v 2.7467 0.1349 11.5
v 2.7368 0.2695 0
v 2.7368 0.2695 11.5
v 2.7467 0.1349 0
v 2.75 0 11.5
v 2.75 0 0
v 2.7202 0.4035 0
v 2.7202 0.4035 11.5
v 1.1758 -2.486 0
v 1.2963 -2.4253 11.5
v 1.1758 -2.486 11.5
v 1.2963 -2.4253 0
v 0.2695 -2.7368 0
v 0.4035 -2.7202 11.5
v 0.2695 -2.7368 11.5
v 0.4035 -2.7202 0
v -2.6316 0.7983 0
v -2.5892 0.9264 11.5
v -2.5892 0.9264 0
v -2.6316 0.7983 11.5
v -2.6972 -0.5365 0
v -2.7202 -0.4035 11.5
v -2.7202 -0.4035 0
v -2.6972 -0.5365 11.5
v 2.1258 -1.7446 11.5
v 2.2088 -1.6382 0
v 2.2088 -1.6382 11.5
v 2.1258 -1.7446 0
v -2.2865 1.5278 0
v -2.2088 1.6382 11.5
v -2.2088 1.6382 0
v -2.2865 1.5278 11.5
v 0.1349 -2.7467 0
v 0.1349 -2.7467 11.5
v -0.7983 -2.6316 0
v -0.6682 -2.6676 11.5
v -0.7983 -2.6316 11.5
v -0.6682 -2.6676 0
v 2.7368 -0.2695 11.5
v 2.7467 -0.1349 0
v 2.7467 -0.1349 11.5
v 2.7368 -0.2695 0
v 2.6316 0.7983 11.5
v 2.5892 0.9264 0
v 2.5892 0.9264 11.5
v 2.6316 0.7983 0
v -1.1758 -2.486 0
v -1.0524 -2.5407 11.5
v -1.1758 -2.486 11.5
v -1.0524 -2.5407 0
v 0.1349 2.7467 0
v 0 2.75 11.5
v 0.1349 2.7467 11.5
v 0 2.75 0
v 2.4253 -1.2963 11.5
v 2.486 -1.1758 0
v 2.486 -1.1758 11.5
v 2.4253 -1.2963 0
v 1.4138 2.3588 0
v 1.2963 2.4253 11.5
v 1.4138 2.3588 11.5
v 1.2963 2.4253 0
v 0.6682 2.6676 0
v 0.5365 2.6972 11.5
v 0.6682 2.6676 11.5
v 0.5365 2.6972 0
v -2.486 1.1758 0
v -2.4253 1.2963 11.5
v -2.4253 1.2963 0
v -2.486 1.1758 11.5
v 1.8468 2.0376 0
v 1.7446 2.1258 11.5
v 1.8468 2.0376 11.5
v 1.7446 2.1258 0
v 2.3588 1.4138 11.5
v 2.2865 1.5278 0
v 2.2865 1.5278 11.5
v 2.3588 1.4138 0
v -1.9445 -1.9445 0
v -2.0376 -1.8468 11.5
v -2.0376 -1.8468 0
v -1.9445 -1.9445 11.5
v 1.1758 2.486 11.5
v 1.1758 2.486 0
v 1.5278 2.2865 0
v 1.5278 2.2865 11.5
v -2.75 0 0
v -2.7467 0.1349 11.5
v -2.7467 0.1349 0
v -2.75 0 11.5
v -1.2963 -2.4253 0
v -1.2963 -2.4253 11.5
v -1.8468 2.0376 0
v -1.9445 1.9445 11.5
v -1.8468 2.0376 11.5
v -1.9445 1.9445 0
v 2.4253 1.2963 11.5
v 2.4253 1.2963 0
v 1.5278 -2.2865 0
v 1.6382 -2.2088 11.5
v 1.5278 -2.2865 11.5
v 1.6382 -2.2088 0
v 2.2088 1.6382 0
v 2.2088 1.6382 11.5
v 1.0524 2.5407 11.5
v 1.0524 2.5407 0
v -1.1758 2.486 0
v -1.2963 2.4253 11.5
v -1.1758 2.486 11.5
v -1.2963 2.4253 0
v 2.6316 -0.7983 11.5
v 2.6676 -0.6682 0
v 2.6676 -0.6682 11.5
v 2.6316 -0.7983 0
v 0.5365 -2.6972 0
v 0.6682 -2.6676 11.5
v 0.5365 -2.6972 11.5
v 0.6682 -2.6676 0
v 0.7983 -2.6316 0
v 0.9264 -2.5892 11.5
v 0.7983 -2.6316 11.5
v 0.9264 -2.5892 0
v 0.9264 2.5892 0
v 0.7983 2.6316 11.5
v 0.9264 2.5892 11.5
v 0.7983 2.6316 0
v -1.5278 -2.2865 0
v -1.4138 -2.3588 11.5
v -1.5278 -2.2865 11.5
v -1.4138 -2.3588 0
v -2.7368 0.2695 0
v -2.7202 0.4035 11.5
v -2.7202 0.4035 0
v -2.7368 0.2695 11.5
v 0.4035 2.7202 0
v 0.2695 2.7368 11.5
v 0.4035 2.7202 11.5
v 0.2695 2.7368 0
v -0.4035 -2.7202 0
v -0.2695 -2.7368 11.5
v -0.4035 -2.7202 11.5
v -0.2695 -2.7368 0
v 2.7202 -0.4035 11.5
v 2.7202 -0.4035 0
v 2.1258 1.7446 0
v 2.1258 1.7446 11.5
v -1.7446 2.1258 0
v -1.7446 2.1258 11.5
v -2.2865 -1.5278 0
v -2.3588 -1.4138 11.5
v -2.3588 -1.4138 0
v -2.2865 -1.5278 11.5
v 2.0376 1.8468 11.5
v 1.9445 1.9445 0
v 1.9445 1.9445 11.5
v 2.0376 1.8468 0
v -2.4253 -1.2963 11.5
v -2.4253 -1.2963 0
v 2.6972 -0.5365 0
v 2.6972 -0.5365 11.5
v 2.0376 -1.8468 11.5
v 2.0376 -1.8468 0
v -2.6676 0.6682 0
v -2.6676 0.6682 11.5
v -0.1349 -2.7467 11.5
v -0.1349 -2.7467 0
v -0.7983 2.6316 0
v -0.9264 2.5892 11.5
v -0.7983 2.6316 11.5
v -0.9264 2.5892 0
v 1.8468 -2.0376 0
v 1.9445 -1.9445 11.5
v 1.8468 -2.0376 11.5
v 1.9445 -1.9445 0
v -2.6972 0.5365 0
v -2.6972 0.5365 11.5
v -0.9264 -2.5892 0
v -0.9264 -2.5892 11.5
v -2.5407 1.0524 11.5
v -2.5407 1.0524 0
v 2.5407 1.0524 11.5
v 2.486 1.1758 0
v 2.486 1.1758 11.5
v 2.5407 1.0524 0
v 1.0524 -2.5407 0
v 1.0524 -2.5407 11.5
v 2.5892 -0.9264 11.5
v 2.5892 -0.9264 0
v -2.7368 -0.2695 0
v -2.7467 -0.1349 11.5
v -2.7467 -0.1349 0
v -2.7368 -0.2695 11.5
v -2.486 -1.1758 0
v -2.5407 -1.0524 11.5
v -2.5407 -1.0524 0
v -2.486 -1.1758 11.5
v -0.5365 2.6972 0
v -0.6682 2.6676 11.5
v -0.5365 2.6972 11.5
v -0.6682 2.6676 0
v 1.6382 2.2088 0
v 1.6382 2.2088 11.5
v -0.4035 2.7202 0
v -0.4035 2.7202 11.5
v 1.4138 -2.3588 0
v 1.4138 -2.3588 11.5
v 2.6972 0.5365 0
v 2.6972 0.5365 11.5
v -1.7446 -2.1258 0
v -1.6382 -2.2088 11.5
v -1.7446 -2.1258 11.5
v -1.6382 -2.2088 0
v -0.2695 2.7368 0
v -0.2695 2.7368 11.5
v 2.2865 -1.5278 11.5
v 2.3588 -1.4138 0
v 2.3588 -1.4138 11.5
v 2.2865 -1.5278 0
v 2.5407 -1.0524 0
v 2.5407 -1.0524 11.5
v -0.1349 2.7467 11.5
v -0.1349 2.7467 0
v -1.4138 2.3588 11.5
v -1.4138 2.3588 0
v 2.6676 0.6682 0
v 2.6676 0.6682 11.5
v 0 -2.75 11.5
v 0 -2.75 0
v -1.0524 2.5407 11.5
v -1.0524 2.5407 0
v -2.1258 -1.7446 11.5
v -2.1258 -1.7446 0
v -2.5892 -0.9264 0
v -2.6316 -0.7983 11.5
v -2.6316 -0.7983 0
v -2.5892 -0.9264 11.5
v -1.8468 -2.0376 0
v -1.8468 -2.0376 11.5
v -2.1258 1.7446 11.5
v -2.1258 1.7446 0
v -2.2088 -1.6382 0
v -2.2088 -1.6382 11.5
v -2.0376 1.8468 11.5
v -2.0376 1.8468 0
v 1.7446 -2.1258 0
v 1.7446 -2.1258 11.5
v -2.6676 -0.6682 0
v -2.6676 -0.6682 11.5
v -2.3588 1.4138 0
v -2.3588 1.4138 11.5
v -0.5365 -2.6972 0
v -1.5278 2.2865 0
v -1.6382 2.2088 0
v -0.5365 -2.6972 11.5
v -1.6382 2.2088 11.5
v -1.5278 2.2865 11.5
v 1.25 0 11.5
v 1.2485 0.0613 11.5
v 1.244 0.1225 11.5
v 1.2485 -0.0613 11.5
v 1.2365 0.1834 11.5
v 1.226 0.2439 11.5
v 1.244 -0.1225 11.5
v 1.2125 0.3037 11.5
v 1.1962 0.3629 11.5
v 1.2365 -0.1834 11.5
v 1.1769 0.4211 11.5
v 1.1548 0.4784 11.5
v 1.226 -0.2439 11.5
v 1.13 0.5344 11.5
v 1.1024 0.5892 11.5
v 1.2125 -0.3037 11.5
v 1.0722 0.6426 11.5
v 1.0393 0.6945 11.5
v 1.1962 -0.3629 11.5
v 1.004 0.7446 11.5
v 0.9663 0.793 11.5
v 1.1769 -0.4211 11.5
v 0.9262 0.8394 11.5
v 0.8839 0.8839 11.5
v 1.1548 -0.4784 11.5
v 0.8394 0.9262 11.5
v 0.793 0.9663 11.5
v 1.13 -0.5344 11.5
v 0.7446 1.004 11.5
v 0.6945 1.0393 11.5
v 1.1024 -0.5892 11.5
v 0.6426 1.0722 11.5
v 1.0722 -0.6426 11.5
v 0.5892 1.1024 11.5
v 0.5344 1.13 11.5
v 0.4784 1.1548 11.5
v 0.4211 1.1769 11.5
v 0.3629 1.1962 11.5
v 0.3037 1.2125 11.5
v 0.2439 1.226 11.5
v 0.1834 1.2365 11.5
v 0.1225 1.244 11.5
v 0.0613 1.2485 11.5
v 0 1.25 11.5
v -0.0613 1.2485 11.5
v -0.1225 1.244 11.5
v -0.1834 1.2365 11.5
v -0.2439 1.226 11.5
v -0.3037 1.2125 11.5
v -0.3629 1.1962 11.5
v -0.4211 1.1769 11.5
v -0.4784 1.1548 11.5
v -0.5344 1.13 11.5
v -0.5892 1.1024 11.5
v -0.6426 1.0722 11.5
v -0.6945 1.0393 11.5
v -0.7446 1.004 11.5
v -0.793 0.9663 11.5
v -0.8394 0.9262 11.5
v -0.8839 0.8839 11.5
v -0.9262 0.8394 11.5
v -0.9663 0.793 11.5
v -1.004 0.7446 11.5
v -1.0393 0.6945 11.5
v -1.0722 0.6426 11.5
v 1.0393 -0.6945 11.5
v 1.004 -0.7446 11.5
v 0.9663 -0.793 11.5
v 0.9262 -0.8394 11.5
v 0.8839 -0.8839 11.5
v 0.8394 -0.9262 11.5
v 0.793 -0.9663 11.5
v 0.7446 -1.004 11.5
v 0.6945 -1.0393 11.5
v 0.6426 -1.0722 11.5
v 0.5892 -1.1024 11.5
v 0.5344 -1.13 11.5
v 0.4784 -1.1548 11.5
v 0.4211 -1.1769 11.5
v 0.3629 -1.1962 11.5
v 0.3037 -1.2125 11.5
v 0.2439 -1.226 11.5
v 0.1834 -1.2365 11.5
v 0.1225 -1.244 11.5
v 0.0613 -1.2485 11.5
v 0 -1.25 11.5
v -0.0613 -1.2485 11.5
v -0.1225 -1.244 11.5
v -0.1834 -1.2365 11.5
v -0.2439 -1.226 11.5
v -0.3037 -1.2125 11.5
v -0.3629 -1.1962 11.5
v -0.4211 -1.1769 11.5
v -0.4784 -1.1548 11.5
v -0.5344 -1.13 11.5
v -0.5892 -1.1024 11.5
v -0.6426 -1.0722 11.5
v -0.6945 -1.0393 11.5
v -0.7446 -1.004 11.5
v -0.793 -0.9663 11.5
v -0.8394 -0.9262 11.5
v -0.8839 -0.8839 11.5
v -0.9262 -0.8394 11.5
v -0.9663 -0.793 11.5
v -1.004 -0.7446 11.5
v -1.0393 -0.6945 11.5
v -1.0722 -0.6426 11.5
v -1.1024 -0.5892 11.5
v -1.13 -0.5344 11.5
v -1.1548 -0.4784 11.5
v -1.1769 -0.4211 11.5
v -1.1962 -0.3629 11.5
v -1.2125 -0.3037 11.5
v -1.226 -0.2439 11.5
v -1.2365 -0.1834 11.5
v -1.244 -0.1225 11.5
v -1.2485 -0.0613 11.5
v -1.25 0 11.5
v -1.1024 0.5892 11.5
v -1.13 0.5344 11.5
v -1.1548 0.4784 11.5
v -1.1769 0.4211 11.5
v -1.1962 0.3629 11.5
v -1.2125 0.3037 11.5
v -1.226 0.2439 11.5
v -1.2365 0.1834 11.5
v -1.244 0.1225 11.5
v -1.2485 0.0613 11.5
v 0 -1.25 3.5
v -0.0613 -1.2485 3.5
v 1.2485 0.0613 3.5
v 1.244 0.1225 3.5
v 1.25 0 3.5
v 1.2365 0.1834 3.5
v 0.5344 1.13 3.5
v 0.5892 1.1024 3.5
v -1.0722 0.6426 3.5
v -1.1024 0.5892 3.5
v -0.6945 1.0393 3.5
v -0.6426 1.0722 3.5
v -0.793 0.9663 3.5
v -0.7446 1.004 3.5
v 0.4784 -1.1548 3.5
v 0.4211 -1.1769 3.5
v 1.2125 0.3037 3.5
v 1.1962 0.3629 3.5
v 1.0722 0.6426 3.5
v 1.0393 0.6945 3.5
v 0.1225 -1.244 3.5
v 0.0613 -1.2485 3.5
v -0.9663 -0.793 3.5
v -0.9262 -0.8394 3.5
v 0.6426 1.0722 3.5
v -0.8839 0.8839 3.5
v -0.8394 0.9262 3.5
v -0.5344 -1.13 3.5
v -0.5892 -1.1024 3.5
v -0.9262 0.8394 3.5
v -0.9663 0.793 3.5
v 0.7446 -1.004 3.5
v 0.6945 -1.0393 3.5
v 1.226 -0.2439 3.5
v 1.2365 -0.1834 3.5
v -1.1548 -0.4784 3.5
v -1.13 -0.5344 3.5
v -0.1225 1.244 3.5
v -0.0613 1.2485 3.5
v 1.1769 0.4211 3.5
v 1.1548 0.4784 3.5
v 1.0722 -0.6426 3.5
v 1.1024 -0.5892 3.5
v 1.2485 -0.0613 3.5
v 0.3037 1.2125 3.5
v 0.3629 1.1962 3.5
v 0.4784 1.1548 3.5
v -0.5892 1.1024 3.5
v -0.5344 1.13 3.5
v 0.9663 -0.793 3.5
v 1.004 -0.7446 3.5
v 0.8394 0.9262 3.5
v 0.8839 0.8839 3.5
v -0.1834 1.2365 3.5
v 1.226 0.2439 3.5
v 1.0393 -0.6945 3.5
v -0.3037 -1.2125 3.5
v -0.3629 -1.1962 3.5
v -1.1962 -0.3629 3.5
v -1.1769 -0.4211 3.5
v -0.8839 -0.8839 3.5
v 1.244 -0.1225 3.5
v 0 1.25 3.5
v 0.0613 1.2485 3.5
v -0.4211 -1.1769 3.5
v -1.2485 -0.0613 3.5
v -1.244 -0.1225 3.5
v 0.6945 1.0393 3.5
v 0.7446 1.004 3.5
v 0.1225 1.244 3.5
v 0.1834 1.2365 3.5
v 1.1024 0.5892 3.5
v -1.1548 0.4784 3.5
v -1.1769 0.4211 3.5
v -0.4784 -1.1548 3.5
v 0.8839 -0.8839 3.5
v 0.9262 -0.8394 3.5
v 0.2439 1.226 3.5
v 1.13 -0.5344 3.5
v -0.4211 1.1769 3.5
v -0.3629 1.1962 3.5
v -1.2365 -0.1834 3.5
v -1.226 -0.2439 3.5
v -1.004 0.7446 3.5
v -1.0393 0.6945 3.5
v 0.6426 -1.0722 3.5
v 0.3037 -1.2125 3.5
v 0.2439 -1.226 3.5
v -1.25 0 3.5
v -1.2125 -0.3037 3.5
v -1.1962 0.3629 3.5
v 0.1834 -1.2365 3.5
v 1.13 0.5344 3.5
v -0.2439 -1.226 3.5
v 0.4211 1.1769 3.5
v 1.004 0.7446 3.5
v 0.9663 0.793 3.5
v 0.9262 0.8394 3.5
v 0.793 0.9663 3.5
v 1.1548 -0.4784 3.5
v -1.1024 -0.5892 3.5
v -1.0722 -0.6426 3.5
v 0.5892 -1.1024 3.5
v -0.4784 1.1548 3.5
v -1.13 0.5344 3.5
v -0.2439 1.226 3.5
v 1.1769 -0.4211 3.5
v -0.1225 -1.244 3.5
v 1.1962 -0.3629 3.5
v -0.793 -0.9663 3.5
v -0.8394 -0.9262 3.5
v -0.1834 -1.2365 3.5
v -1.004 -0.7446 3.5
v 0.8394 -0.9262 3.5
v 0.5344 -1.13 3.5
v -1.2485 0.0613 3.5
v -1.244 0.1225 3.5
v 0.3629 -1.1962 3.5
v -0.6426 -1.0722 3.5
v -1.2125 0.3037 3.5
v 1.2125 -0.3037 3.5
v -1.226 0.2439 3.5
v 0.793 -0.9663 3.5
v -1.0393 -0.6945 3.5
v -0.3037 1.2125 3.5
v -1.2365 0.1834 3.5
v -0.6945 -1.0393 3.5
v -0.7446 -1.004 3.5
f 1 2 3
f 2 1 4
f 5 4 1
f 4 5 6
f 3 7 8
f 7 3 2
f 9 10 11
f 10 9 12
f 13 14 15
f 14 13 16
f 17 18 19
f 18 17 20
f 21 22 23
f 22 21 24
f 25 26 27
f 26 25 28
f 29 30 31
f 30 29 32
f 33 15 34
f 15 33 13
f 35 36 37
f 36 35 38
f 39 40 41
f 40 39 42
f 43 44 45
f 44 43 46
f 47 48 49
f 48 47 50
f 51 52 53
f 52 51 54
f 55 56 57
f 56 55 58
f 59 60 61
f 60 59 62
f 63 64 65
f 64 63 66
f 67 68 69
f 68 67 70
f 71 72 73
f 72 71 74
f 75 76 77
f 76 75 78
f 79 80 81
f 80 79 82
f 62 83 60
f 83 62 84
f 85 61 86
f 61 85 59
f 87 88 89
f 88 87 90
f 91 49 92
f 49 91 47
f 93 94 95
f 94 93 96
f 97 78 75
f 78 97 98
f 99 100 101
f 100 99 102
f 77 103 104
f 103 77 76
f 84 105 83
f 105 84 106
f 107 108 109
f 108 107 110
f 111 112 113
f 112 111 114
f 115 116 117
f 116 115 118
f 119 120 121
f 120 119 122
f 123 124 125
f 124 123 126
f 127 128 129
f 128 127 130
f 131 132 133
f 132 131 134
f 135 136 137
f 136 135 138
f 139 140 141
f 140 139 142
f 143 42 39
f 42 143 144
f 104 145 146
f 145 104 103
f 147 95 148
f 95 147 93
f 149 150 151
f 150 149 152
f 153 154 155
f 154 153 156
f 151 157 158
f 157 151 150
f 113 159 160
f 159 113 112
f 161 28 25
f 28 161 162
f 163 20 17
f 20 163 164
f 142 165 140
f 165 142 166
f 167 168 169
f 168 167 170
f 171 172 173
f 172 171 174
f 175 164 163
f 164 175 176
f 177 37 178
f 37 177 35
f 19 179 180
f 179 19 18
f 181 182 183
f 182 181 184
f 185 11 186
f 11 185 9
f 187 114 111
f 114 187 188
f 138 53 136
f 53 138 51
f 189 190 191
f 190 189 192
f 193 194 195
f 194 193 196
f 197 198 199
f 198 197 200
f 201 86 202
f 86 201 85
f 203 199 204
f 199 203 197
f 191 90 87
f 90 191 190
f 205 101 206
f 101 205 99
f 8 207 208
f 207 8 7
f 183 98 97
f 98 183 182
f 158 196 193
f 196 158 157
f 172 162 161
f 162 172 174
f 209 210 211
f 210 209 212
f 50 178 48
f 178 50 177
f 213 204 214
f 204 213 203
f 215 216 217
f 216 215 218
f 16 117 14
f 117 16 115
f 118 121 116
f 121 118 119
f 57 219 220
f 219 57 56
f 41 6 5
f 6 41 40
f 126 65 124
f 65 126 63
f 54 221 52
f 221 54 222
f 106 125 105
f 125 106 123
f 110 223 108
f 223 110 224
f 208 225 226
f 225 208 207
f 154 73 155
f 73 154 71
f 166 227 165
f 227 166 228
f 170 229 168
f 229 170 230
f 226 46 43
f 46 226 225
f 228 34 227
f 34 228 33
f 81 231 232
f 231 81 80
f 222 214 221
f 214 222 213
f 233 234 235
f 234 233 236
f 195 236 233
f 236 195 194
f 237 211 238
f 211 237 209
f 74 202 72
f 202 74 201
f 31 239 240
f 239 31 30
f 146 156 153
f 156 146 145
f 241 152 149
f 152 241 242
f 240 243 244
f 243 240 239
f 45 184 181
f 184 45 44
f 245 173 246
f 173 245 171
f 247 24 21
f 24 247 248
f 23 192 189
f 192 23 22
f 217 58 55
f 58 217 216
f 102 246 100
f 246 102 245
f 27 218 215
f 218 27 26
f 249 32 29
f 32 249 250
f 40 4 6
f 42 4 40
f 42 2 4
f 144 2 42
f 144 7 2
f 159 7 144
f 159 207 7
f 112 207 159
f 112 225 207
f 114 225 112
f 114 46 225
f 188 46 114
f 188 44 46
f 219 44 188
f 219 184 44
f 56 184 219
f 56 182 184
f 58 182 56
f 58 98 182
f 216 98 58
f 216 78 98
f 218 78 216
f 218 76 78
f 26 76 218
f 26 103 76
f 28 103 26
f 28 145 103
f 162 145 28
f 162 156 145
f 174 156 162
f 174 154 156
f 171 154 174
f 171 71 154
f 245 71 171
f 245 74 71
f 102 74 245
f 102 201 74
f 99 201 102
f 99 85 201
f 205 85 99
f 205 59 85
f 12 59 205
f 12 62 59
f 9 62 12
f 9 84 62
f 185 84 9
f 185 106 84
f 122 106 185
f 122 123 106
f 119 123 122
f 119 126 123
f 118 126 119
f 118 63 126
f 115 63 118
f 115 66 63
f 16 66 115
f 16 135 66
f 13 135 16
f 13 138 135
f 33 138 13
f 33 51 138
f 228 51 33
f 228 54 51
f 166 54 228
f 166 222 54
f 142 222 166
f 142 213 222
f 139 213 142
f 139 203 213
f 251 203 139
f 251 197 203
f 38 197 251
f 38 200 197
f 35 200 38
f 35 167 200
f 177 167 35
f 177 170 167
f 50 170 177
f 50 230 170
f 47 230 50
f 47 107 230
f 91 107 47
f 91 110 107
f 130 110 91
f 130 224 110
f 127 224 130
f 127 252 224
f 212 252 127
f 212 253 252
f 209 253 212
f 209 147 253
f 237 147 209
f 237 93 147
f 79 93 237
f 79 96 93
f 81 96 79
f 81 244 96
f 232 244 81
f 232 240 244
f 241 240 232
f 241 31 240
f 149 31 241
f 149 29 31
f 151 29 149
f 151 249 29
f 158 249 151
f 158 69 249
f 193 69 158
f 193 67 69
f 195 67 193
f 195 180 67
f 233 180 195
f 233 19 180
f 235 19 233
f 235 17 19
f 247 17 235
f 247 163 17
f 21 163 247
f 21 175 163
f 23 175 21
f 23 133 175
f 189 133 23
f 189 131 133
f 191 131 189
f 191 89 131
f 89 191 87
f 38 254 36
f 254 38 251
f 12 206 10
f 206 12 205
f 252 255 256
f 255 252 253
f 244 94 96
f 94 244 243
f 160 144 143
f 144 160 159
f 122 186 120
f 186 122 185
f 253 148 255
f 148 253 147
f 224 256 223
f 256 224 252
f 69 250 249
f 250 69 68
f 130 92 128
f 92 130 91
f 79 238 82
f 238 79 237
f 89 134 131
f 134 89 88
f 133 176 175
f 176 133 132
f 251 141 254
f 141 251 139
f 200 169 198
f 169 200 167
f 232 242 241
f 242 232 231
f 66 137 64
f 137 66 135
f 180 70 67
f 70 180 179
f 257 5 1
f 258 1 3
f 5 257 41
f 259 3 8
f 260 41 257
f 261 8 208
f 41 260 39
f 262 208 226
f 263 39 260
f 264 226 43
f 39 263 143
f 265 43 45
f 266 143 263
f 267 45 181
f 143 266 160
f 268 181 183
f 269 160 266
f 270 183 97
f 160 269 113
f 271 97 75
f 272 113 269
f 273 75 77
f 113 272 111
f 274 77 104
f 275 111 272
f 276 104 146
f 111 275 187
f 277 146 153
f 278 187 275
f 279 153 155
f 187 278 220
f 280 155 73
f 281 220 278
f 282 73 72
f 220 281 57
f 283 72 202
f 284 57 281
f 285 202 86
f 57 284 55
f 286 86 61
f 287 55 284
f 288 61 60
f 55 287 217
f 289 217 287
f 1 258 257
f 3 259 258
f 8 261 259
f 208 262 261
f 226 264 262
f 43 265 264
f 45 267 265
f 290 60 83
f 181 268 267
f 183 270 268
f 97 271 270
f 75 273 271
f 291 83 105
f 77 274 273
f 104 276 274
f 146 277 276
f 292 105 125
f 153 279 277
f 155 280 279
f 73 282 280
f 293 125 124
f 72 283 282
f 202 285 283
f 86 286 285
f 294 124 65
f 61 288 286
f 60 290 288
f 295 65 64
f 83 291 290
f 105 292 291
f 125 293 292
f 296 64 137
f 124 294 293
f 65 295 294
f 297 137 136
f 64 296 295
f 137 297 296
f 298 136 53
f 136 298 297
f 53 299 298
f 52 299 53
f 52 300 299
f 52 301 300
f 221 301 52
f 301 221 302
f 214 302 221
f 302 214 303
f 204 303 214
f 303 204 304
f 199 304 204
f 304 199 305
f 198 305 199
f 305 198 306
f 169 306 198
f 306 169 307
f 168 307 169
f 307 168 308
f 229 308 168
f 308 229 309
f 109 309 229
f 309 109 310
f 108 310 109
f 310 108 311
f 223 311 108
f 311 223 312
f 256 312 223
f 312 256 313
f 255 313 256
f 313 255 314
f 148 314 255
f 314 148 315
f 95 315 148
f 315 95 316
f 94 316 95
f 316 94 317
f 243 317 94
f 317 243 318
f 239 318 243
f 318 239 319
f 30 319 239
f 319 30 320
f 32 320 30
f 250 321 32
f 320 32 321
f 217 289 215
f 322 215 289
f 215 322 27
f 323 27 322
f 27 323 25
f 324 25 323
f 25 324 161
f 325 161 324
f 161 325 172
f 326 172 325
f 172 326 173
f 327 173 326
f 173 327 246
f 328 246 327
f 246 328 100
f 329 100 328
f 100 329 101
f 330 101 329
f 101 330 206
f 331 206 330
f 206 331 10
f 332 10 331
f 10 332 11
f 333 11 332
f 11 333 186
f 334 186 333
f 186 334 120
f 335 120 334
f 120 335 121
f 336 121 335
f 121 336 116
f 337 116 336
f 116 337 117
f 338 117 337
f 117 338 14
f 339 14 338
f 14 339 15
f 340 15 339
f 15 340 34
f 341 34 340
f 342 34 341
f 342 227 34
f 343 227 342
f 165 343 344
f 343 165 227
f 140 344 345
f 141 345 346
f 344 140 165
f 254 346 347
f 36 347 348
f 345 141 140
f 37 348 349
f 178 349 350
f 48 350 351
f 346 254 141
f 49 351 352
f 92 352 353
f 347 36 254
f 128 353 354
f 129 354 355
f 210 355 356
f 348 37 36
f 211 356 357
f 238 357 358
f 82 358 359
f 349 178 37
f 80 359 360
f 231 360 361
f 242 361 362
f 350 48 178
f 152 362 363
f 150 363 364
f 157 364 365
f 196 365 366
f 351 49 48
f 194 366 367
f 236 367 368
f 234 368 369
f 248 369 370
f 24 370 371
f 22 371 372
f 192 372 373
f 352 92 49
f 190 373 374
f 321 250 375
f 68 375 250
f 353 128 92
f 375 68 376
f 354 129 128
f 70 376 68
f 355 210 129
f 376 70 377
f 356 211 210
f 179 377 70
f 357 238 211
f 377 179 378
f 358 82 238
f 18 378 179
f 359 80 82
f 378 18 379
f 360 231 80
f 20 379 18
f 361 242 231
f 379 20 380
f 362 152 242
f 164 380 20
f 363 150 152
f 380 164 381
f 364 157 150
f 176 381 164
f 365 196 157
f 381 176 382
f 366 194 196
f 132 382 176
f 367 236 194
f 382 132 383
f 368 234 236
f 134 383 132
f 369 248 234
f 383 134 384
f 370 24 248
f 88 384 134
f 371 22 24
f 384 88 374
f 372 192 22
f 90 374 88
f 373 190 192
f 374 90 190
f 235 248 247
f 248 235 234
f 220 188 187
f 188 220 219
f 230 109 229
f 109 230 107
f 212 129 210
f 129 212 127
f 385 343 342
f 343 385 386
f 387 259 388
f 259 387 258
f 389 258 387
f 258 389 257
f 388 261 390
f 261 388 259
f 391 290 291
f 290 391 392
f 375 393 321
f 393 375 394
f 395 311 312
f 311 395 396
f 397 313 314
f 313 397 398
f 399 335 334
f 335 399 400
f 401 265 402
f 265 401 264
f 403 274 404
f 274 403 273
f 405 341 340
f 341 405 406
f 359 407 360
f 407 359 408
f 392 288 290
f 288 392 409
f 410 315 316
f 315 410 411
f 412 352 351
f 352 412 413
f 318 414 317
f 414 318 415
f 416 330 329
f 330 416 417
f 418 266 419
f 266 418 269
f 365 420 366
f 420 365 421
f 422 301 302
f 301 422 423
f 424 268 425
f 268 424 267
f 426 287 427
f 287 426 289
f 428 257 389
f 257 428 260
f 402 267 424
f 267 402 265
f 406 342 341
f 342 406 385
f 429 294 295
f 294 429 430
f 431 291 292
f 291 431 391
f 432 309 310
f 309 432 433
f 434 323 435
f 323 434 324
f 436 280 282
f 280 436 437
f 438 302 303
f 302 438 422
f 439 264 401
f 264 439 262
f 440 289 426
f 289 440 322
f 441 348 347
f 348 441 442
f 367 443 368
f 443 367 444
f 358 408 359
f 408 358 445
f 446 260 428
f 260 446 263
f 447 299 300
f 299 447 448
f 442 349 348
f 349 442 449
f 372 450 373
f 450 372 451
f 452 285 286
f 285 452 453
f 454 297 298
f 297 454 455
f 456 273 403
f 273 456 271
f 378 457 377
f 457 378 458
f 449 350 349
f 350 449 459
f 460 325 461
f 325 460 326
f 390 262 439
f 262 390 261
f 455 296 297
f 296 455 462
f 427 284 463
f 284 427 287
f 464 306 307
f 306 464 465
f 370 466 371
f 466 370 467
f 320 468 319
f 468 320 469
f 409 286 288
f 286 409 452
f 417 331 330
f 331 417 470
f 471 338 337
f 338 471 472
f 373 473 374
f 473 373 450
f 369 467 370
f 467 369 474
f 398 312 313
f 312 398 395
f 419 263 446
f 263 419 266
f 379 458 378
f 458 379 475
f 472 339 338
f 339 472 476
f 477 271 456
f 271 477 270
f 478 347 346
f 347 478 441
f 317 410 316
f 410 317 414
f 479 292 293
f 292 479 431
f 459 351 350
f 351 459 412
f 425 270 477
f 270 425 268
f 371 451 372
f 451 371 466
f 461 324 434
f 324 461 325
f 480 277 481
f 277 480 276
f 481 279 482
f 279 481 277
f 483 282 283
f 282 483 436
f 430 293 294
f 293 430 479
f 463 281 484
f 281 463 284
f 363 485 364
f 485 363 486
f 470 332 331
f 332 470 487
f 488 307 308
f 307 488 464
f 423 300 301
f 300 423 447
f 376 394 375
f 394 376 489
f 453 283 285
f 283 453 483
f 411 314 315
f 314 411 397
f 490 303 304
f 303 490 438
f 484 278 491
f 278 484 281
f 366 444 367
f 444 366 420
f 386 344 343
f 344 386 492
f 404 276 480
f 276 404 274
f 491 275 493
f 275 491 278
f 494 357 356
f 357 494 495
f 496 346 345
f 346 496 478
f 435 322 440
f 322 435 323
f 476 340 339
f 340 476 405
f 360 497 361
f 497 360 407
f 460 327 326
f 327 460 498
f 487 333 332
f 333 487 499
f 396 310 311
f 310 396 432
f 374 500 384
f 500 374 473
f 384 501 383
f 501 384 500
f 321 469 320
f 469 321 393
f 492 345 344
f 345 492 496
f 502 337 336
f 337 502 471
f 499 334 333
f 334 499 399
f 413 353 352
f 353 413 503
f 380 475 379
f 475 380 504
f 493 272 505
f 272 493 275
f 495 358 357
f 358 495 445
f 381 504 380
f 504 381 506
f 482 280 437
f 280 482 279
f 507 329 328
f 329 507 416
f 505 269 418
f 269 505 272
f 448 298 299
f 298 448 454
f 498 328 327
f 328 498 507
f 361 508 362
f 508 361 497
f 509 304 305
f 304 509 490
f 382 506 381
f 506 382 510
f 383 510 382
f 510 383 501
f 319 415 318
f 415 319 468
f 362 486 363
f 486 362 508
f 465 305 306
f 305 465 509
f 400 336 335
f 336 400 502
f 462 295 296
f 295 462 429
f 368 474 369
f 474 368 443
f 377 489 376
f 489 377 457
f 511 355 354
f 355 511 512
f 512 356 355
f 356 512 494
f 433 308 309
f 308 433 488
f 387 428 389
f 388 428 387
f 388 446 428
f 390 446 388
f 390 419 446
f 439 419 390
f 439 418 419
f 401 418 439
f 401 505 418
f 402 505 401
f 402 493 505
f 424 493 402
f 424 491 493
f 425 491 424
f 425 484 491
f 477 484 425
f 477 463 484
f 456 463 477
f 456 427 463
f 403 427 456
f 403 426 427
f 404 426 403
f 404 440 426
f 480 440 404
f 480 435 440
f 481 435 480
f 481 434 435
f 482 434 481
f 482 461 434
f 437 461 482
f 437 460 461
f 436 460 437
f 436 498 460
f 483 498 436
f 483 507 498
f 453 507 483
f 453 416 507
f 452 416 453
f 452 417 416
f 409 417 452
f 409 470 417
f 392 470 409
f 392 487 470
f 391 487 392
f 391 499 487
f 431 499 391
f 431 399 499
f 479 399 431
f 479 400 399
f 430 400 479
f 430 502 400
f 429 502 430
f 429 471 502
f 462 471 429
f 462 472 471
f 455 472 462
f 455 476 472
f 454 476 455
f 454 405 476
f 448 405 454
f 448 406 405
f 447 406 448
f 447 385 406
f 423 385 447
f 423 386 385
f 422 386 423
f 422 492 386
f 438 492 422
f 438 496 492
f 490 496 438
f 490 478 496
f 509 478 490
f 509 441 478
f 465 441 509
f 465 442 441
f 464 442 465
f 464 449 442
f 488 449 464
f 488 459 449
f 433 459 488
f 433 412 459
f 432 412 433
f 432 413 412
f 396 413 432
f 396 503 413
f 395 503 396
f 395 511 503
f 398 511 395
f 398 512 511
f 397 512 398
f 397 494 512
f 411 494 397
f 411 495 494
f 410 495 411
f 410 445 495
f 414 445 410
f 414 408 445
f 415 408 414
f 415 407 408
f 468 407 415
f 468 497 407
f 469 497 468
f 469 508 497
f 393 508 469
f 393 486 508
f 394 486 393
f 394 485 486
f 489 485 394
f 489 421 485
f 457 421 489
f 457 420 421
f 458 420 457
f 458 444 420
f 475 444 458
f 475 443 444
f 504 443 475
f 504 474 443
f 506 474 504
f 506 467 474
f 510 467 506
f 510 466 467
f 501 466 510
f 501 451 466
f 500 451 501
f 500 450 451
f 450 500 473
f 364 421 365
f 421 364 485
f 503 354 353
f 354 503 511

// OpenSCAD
// --- INCLUDES ---
/*
All common dimensions are stored in their own SCAD file so that variables are consistent throughout
the multiple files created for this project.
*/
include <Common_Dimensions.scad> // Needs UNDEF

// --- RENDER RESOLUTION ---
/*
Set the rendering resolution. Lower for lower-power systems.
*/
$fn = 128;

// --- DIMENSIONS ---
/*
Local dimensions that are specific to this drawing
*/

// --- FUNCTIONS ---
/*
Functions that make the code more legible and reusable
*/
// No functions

// --- MODULES ---
/*
Cutouts and extrusions are all mapped to their own modules to make the model more readable and
reusable.
*/

// Create a post to mount a component
module mount_post(dia=pcb_mnt_dia, r=UNDEF, d=pcb_mnt_d, bore_dia=pcb_mnt_bore_dia, bore_r=UNDEF, bore_d=pcb_mnt_bore_d)
{
    // Determine main body dimensions
    dia = r == UNDEF ? dia : r * 2;
    
    // Determine the bore dimensions
    bore_dia = bore_r == UNDEF ? bore_dia : bore_r * 2;

    difference()
    {
        cylinder(d=dia, h=d);
        translate([0, 0, d - bore_d]) cylinder(d=bore_dia, h=bore_d);
    }
}

// Create a pin mount for hinged components
module pin_mount(dia=UNDEF, r=UNDEF, d=UNDEF, bore_dia=UNDEF, bore_r=UNDEF, spring=UNDEF, wall=UNDEF, top=false, tol=0.01)
{
    // Determine the main body diameter
    dia             = r == UNDEF ? dia : r * 2;
    
    // Determine the bore diameter
    bore_dia        = bore_r == UNDEF ? bore_dia : bore_r * 2;
    
    // Determine spacing dimensions. If undefined, assume 0.
    wall            = wall == UNDEF ? 0.0 : wall;
    spring          = spring == UNDEF ? 0.0 : spring;
    
    // Get the measurements for the mount
    total_w         = dia + wall;
    offset_w        = total_w - dia / 2;
    total_h         = dia;
    
    // Pre-calculate offsets
    body_offset_x   = -total_w / 2.0 + dia / 2.0;
    body_offset_y   = -dia / 2.0;
    
    // Calculate the height of each slice (before applying tolerance) - there are 4 slices used for a pin mount - 2 for each side
    slice_height = (d - spring) / 4.0;

    difference()
    {
        // Create the main solid
        union()
        {
            translate([body_offset_x,           0.0, 0.0]) cylinder(d=dia, h=d);
            translate([body_offset_x, body_offset_y, 0.0]) cube([wall + dia / 2.0, dia, d]);
        }
        
        // Create the shaft for the pin
        translate([body_offset_x, 0.0, 0.0]) cylinder(d=bore_dia, h=d);
        
        // Remove the spring space and slices that are a part of the complementing body
        // Remove depending on whether the "top" or the "botton" are specified.
        if (top)
        {
            translate([-total_w / 2, -total_h / 2,                0.0])                     cube([dia, dia, slice_height - tol / 2]);
            translate([-total_w / 2, -total_h / 2, slice_height * 2.0])                     cube([dia, dia, slice_height + spring - tol / 2]);
        }
        else
        {
            translate([-total_w / 2, -total_h / 2, slice_height + tol / 2])                 cube([dia, dia, slice_height - tol / 2]);
            translate([-total_w / 2, -total_h / 2, slice_height * 2.0])                     cube([dia, dia, spring]);
            translate([-total_w / 2, -total_h / 2, slice_height * 3.0 + spring + tol / 2])  cube([dia, dia, spring + slice_height - tol / 2]);
        }
    }
}

// --- MAIN BODY MODULES ---
/*
Modules that draws the main bodies of the components.
*/

// Draw a mounting post for the main PCB
module pcb_mount_post(dia=pcb_mnt_dia, r=UNDEF, d=pcb_mnt_d, bore_dia=pcb_mnt_bore_dia, bore_d=pcb_mnt_bore_d)
{
    mount_post(dia=dia, r=r, d=d, bore_dia=bore_dia, bore_d=bore_d);
}

// --- RENDER ---
/*
Actually draw the main shell - In this case, perform a test to make sure the module functions as expected.
*/

pcb_mount_post();
